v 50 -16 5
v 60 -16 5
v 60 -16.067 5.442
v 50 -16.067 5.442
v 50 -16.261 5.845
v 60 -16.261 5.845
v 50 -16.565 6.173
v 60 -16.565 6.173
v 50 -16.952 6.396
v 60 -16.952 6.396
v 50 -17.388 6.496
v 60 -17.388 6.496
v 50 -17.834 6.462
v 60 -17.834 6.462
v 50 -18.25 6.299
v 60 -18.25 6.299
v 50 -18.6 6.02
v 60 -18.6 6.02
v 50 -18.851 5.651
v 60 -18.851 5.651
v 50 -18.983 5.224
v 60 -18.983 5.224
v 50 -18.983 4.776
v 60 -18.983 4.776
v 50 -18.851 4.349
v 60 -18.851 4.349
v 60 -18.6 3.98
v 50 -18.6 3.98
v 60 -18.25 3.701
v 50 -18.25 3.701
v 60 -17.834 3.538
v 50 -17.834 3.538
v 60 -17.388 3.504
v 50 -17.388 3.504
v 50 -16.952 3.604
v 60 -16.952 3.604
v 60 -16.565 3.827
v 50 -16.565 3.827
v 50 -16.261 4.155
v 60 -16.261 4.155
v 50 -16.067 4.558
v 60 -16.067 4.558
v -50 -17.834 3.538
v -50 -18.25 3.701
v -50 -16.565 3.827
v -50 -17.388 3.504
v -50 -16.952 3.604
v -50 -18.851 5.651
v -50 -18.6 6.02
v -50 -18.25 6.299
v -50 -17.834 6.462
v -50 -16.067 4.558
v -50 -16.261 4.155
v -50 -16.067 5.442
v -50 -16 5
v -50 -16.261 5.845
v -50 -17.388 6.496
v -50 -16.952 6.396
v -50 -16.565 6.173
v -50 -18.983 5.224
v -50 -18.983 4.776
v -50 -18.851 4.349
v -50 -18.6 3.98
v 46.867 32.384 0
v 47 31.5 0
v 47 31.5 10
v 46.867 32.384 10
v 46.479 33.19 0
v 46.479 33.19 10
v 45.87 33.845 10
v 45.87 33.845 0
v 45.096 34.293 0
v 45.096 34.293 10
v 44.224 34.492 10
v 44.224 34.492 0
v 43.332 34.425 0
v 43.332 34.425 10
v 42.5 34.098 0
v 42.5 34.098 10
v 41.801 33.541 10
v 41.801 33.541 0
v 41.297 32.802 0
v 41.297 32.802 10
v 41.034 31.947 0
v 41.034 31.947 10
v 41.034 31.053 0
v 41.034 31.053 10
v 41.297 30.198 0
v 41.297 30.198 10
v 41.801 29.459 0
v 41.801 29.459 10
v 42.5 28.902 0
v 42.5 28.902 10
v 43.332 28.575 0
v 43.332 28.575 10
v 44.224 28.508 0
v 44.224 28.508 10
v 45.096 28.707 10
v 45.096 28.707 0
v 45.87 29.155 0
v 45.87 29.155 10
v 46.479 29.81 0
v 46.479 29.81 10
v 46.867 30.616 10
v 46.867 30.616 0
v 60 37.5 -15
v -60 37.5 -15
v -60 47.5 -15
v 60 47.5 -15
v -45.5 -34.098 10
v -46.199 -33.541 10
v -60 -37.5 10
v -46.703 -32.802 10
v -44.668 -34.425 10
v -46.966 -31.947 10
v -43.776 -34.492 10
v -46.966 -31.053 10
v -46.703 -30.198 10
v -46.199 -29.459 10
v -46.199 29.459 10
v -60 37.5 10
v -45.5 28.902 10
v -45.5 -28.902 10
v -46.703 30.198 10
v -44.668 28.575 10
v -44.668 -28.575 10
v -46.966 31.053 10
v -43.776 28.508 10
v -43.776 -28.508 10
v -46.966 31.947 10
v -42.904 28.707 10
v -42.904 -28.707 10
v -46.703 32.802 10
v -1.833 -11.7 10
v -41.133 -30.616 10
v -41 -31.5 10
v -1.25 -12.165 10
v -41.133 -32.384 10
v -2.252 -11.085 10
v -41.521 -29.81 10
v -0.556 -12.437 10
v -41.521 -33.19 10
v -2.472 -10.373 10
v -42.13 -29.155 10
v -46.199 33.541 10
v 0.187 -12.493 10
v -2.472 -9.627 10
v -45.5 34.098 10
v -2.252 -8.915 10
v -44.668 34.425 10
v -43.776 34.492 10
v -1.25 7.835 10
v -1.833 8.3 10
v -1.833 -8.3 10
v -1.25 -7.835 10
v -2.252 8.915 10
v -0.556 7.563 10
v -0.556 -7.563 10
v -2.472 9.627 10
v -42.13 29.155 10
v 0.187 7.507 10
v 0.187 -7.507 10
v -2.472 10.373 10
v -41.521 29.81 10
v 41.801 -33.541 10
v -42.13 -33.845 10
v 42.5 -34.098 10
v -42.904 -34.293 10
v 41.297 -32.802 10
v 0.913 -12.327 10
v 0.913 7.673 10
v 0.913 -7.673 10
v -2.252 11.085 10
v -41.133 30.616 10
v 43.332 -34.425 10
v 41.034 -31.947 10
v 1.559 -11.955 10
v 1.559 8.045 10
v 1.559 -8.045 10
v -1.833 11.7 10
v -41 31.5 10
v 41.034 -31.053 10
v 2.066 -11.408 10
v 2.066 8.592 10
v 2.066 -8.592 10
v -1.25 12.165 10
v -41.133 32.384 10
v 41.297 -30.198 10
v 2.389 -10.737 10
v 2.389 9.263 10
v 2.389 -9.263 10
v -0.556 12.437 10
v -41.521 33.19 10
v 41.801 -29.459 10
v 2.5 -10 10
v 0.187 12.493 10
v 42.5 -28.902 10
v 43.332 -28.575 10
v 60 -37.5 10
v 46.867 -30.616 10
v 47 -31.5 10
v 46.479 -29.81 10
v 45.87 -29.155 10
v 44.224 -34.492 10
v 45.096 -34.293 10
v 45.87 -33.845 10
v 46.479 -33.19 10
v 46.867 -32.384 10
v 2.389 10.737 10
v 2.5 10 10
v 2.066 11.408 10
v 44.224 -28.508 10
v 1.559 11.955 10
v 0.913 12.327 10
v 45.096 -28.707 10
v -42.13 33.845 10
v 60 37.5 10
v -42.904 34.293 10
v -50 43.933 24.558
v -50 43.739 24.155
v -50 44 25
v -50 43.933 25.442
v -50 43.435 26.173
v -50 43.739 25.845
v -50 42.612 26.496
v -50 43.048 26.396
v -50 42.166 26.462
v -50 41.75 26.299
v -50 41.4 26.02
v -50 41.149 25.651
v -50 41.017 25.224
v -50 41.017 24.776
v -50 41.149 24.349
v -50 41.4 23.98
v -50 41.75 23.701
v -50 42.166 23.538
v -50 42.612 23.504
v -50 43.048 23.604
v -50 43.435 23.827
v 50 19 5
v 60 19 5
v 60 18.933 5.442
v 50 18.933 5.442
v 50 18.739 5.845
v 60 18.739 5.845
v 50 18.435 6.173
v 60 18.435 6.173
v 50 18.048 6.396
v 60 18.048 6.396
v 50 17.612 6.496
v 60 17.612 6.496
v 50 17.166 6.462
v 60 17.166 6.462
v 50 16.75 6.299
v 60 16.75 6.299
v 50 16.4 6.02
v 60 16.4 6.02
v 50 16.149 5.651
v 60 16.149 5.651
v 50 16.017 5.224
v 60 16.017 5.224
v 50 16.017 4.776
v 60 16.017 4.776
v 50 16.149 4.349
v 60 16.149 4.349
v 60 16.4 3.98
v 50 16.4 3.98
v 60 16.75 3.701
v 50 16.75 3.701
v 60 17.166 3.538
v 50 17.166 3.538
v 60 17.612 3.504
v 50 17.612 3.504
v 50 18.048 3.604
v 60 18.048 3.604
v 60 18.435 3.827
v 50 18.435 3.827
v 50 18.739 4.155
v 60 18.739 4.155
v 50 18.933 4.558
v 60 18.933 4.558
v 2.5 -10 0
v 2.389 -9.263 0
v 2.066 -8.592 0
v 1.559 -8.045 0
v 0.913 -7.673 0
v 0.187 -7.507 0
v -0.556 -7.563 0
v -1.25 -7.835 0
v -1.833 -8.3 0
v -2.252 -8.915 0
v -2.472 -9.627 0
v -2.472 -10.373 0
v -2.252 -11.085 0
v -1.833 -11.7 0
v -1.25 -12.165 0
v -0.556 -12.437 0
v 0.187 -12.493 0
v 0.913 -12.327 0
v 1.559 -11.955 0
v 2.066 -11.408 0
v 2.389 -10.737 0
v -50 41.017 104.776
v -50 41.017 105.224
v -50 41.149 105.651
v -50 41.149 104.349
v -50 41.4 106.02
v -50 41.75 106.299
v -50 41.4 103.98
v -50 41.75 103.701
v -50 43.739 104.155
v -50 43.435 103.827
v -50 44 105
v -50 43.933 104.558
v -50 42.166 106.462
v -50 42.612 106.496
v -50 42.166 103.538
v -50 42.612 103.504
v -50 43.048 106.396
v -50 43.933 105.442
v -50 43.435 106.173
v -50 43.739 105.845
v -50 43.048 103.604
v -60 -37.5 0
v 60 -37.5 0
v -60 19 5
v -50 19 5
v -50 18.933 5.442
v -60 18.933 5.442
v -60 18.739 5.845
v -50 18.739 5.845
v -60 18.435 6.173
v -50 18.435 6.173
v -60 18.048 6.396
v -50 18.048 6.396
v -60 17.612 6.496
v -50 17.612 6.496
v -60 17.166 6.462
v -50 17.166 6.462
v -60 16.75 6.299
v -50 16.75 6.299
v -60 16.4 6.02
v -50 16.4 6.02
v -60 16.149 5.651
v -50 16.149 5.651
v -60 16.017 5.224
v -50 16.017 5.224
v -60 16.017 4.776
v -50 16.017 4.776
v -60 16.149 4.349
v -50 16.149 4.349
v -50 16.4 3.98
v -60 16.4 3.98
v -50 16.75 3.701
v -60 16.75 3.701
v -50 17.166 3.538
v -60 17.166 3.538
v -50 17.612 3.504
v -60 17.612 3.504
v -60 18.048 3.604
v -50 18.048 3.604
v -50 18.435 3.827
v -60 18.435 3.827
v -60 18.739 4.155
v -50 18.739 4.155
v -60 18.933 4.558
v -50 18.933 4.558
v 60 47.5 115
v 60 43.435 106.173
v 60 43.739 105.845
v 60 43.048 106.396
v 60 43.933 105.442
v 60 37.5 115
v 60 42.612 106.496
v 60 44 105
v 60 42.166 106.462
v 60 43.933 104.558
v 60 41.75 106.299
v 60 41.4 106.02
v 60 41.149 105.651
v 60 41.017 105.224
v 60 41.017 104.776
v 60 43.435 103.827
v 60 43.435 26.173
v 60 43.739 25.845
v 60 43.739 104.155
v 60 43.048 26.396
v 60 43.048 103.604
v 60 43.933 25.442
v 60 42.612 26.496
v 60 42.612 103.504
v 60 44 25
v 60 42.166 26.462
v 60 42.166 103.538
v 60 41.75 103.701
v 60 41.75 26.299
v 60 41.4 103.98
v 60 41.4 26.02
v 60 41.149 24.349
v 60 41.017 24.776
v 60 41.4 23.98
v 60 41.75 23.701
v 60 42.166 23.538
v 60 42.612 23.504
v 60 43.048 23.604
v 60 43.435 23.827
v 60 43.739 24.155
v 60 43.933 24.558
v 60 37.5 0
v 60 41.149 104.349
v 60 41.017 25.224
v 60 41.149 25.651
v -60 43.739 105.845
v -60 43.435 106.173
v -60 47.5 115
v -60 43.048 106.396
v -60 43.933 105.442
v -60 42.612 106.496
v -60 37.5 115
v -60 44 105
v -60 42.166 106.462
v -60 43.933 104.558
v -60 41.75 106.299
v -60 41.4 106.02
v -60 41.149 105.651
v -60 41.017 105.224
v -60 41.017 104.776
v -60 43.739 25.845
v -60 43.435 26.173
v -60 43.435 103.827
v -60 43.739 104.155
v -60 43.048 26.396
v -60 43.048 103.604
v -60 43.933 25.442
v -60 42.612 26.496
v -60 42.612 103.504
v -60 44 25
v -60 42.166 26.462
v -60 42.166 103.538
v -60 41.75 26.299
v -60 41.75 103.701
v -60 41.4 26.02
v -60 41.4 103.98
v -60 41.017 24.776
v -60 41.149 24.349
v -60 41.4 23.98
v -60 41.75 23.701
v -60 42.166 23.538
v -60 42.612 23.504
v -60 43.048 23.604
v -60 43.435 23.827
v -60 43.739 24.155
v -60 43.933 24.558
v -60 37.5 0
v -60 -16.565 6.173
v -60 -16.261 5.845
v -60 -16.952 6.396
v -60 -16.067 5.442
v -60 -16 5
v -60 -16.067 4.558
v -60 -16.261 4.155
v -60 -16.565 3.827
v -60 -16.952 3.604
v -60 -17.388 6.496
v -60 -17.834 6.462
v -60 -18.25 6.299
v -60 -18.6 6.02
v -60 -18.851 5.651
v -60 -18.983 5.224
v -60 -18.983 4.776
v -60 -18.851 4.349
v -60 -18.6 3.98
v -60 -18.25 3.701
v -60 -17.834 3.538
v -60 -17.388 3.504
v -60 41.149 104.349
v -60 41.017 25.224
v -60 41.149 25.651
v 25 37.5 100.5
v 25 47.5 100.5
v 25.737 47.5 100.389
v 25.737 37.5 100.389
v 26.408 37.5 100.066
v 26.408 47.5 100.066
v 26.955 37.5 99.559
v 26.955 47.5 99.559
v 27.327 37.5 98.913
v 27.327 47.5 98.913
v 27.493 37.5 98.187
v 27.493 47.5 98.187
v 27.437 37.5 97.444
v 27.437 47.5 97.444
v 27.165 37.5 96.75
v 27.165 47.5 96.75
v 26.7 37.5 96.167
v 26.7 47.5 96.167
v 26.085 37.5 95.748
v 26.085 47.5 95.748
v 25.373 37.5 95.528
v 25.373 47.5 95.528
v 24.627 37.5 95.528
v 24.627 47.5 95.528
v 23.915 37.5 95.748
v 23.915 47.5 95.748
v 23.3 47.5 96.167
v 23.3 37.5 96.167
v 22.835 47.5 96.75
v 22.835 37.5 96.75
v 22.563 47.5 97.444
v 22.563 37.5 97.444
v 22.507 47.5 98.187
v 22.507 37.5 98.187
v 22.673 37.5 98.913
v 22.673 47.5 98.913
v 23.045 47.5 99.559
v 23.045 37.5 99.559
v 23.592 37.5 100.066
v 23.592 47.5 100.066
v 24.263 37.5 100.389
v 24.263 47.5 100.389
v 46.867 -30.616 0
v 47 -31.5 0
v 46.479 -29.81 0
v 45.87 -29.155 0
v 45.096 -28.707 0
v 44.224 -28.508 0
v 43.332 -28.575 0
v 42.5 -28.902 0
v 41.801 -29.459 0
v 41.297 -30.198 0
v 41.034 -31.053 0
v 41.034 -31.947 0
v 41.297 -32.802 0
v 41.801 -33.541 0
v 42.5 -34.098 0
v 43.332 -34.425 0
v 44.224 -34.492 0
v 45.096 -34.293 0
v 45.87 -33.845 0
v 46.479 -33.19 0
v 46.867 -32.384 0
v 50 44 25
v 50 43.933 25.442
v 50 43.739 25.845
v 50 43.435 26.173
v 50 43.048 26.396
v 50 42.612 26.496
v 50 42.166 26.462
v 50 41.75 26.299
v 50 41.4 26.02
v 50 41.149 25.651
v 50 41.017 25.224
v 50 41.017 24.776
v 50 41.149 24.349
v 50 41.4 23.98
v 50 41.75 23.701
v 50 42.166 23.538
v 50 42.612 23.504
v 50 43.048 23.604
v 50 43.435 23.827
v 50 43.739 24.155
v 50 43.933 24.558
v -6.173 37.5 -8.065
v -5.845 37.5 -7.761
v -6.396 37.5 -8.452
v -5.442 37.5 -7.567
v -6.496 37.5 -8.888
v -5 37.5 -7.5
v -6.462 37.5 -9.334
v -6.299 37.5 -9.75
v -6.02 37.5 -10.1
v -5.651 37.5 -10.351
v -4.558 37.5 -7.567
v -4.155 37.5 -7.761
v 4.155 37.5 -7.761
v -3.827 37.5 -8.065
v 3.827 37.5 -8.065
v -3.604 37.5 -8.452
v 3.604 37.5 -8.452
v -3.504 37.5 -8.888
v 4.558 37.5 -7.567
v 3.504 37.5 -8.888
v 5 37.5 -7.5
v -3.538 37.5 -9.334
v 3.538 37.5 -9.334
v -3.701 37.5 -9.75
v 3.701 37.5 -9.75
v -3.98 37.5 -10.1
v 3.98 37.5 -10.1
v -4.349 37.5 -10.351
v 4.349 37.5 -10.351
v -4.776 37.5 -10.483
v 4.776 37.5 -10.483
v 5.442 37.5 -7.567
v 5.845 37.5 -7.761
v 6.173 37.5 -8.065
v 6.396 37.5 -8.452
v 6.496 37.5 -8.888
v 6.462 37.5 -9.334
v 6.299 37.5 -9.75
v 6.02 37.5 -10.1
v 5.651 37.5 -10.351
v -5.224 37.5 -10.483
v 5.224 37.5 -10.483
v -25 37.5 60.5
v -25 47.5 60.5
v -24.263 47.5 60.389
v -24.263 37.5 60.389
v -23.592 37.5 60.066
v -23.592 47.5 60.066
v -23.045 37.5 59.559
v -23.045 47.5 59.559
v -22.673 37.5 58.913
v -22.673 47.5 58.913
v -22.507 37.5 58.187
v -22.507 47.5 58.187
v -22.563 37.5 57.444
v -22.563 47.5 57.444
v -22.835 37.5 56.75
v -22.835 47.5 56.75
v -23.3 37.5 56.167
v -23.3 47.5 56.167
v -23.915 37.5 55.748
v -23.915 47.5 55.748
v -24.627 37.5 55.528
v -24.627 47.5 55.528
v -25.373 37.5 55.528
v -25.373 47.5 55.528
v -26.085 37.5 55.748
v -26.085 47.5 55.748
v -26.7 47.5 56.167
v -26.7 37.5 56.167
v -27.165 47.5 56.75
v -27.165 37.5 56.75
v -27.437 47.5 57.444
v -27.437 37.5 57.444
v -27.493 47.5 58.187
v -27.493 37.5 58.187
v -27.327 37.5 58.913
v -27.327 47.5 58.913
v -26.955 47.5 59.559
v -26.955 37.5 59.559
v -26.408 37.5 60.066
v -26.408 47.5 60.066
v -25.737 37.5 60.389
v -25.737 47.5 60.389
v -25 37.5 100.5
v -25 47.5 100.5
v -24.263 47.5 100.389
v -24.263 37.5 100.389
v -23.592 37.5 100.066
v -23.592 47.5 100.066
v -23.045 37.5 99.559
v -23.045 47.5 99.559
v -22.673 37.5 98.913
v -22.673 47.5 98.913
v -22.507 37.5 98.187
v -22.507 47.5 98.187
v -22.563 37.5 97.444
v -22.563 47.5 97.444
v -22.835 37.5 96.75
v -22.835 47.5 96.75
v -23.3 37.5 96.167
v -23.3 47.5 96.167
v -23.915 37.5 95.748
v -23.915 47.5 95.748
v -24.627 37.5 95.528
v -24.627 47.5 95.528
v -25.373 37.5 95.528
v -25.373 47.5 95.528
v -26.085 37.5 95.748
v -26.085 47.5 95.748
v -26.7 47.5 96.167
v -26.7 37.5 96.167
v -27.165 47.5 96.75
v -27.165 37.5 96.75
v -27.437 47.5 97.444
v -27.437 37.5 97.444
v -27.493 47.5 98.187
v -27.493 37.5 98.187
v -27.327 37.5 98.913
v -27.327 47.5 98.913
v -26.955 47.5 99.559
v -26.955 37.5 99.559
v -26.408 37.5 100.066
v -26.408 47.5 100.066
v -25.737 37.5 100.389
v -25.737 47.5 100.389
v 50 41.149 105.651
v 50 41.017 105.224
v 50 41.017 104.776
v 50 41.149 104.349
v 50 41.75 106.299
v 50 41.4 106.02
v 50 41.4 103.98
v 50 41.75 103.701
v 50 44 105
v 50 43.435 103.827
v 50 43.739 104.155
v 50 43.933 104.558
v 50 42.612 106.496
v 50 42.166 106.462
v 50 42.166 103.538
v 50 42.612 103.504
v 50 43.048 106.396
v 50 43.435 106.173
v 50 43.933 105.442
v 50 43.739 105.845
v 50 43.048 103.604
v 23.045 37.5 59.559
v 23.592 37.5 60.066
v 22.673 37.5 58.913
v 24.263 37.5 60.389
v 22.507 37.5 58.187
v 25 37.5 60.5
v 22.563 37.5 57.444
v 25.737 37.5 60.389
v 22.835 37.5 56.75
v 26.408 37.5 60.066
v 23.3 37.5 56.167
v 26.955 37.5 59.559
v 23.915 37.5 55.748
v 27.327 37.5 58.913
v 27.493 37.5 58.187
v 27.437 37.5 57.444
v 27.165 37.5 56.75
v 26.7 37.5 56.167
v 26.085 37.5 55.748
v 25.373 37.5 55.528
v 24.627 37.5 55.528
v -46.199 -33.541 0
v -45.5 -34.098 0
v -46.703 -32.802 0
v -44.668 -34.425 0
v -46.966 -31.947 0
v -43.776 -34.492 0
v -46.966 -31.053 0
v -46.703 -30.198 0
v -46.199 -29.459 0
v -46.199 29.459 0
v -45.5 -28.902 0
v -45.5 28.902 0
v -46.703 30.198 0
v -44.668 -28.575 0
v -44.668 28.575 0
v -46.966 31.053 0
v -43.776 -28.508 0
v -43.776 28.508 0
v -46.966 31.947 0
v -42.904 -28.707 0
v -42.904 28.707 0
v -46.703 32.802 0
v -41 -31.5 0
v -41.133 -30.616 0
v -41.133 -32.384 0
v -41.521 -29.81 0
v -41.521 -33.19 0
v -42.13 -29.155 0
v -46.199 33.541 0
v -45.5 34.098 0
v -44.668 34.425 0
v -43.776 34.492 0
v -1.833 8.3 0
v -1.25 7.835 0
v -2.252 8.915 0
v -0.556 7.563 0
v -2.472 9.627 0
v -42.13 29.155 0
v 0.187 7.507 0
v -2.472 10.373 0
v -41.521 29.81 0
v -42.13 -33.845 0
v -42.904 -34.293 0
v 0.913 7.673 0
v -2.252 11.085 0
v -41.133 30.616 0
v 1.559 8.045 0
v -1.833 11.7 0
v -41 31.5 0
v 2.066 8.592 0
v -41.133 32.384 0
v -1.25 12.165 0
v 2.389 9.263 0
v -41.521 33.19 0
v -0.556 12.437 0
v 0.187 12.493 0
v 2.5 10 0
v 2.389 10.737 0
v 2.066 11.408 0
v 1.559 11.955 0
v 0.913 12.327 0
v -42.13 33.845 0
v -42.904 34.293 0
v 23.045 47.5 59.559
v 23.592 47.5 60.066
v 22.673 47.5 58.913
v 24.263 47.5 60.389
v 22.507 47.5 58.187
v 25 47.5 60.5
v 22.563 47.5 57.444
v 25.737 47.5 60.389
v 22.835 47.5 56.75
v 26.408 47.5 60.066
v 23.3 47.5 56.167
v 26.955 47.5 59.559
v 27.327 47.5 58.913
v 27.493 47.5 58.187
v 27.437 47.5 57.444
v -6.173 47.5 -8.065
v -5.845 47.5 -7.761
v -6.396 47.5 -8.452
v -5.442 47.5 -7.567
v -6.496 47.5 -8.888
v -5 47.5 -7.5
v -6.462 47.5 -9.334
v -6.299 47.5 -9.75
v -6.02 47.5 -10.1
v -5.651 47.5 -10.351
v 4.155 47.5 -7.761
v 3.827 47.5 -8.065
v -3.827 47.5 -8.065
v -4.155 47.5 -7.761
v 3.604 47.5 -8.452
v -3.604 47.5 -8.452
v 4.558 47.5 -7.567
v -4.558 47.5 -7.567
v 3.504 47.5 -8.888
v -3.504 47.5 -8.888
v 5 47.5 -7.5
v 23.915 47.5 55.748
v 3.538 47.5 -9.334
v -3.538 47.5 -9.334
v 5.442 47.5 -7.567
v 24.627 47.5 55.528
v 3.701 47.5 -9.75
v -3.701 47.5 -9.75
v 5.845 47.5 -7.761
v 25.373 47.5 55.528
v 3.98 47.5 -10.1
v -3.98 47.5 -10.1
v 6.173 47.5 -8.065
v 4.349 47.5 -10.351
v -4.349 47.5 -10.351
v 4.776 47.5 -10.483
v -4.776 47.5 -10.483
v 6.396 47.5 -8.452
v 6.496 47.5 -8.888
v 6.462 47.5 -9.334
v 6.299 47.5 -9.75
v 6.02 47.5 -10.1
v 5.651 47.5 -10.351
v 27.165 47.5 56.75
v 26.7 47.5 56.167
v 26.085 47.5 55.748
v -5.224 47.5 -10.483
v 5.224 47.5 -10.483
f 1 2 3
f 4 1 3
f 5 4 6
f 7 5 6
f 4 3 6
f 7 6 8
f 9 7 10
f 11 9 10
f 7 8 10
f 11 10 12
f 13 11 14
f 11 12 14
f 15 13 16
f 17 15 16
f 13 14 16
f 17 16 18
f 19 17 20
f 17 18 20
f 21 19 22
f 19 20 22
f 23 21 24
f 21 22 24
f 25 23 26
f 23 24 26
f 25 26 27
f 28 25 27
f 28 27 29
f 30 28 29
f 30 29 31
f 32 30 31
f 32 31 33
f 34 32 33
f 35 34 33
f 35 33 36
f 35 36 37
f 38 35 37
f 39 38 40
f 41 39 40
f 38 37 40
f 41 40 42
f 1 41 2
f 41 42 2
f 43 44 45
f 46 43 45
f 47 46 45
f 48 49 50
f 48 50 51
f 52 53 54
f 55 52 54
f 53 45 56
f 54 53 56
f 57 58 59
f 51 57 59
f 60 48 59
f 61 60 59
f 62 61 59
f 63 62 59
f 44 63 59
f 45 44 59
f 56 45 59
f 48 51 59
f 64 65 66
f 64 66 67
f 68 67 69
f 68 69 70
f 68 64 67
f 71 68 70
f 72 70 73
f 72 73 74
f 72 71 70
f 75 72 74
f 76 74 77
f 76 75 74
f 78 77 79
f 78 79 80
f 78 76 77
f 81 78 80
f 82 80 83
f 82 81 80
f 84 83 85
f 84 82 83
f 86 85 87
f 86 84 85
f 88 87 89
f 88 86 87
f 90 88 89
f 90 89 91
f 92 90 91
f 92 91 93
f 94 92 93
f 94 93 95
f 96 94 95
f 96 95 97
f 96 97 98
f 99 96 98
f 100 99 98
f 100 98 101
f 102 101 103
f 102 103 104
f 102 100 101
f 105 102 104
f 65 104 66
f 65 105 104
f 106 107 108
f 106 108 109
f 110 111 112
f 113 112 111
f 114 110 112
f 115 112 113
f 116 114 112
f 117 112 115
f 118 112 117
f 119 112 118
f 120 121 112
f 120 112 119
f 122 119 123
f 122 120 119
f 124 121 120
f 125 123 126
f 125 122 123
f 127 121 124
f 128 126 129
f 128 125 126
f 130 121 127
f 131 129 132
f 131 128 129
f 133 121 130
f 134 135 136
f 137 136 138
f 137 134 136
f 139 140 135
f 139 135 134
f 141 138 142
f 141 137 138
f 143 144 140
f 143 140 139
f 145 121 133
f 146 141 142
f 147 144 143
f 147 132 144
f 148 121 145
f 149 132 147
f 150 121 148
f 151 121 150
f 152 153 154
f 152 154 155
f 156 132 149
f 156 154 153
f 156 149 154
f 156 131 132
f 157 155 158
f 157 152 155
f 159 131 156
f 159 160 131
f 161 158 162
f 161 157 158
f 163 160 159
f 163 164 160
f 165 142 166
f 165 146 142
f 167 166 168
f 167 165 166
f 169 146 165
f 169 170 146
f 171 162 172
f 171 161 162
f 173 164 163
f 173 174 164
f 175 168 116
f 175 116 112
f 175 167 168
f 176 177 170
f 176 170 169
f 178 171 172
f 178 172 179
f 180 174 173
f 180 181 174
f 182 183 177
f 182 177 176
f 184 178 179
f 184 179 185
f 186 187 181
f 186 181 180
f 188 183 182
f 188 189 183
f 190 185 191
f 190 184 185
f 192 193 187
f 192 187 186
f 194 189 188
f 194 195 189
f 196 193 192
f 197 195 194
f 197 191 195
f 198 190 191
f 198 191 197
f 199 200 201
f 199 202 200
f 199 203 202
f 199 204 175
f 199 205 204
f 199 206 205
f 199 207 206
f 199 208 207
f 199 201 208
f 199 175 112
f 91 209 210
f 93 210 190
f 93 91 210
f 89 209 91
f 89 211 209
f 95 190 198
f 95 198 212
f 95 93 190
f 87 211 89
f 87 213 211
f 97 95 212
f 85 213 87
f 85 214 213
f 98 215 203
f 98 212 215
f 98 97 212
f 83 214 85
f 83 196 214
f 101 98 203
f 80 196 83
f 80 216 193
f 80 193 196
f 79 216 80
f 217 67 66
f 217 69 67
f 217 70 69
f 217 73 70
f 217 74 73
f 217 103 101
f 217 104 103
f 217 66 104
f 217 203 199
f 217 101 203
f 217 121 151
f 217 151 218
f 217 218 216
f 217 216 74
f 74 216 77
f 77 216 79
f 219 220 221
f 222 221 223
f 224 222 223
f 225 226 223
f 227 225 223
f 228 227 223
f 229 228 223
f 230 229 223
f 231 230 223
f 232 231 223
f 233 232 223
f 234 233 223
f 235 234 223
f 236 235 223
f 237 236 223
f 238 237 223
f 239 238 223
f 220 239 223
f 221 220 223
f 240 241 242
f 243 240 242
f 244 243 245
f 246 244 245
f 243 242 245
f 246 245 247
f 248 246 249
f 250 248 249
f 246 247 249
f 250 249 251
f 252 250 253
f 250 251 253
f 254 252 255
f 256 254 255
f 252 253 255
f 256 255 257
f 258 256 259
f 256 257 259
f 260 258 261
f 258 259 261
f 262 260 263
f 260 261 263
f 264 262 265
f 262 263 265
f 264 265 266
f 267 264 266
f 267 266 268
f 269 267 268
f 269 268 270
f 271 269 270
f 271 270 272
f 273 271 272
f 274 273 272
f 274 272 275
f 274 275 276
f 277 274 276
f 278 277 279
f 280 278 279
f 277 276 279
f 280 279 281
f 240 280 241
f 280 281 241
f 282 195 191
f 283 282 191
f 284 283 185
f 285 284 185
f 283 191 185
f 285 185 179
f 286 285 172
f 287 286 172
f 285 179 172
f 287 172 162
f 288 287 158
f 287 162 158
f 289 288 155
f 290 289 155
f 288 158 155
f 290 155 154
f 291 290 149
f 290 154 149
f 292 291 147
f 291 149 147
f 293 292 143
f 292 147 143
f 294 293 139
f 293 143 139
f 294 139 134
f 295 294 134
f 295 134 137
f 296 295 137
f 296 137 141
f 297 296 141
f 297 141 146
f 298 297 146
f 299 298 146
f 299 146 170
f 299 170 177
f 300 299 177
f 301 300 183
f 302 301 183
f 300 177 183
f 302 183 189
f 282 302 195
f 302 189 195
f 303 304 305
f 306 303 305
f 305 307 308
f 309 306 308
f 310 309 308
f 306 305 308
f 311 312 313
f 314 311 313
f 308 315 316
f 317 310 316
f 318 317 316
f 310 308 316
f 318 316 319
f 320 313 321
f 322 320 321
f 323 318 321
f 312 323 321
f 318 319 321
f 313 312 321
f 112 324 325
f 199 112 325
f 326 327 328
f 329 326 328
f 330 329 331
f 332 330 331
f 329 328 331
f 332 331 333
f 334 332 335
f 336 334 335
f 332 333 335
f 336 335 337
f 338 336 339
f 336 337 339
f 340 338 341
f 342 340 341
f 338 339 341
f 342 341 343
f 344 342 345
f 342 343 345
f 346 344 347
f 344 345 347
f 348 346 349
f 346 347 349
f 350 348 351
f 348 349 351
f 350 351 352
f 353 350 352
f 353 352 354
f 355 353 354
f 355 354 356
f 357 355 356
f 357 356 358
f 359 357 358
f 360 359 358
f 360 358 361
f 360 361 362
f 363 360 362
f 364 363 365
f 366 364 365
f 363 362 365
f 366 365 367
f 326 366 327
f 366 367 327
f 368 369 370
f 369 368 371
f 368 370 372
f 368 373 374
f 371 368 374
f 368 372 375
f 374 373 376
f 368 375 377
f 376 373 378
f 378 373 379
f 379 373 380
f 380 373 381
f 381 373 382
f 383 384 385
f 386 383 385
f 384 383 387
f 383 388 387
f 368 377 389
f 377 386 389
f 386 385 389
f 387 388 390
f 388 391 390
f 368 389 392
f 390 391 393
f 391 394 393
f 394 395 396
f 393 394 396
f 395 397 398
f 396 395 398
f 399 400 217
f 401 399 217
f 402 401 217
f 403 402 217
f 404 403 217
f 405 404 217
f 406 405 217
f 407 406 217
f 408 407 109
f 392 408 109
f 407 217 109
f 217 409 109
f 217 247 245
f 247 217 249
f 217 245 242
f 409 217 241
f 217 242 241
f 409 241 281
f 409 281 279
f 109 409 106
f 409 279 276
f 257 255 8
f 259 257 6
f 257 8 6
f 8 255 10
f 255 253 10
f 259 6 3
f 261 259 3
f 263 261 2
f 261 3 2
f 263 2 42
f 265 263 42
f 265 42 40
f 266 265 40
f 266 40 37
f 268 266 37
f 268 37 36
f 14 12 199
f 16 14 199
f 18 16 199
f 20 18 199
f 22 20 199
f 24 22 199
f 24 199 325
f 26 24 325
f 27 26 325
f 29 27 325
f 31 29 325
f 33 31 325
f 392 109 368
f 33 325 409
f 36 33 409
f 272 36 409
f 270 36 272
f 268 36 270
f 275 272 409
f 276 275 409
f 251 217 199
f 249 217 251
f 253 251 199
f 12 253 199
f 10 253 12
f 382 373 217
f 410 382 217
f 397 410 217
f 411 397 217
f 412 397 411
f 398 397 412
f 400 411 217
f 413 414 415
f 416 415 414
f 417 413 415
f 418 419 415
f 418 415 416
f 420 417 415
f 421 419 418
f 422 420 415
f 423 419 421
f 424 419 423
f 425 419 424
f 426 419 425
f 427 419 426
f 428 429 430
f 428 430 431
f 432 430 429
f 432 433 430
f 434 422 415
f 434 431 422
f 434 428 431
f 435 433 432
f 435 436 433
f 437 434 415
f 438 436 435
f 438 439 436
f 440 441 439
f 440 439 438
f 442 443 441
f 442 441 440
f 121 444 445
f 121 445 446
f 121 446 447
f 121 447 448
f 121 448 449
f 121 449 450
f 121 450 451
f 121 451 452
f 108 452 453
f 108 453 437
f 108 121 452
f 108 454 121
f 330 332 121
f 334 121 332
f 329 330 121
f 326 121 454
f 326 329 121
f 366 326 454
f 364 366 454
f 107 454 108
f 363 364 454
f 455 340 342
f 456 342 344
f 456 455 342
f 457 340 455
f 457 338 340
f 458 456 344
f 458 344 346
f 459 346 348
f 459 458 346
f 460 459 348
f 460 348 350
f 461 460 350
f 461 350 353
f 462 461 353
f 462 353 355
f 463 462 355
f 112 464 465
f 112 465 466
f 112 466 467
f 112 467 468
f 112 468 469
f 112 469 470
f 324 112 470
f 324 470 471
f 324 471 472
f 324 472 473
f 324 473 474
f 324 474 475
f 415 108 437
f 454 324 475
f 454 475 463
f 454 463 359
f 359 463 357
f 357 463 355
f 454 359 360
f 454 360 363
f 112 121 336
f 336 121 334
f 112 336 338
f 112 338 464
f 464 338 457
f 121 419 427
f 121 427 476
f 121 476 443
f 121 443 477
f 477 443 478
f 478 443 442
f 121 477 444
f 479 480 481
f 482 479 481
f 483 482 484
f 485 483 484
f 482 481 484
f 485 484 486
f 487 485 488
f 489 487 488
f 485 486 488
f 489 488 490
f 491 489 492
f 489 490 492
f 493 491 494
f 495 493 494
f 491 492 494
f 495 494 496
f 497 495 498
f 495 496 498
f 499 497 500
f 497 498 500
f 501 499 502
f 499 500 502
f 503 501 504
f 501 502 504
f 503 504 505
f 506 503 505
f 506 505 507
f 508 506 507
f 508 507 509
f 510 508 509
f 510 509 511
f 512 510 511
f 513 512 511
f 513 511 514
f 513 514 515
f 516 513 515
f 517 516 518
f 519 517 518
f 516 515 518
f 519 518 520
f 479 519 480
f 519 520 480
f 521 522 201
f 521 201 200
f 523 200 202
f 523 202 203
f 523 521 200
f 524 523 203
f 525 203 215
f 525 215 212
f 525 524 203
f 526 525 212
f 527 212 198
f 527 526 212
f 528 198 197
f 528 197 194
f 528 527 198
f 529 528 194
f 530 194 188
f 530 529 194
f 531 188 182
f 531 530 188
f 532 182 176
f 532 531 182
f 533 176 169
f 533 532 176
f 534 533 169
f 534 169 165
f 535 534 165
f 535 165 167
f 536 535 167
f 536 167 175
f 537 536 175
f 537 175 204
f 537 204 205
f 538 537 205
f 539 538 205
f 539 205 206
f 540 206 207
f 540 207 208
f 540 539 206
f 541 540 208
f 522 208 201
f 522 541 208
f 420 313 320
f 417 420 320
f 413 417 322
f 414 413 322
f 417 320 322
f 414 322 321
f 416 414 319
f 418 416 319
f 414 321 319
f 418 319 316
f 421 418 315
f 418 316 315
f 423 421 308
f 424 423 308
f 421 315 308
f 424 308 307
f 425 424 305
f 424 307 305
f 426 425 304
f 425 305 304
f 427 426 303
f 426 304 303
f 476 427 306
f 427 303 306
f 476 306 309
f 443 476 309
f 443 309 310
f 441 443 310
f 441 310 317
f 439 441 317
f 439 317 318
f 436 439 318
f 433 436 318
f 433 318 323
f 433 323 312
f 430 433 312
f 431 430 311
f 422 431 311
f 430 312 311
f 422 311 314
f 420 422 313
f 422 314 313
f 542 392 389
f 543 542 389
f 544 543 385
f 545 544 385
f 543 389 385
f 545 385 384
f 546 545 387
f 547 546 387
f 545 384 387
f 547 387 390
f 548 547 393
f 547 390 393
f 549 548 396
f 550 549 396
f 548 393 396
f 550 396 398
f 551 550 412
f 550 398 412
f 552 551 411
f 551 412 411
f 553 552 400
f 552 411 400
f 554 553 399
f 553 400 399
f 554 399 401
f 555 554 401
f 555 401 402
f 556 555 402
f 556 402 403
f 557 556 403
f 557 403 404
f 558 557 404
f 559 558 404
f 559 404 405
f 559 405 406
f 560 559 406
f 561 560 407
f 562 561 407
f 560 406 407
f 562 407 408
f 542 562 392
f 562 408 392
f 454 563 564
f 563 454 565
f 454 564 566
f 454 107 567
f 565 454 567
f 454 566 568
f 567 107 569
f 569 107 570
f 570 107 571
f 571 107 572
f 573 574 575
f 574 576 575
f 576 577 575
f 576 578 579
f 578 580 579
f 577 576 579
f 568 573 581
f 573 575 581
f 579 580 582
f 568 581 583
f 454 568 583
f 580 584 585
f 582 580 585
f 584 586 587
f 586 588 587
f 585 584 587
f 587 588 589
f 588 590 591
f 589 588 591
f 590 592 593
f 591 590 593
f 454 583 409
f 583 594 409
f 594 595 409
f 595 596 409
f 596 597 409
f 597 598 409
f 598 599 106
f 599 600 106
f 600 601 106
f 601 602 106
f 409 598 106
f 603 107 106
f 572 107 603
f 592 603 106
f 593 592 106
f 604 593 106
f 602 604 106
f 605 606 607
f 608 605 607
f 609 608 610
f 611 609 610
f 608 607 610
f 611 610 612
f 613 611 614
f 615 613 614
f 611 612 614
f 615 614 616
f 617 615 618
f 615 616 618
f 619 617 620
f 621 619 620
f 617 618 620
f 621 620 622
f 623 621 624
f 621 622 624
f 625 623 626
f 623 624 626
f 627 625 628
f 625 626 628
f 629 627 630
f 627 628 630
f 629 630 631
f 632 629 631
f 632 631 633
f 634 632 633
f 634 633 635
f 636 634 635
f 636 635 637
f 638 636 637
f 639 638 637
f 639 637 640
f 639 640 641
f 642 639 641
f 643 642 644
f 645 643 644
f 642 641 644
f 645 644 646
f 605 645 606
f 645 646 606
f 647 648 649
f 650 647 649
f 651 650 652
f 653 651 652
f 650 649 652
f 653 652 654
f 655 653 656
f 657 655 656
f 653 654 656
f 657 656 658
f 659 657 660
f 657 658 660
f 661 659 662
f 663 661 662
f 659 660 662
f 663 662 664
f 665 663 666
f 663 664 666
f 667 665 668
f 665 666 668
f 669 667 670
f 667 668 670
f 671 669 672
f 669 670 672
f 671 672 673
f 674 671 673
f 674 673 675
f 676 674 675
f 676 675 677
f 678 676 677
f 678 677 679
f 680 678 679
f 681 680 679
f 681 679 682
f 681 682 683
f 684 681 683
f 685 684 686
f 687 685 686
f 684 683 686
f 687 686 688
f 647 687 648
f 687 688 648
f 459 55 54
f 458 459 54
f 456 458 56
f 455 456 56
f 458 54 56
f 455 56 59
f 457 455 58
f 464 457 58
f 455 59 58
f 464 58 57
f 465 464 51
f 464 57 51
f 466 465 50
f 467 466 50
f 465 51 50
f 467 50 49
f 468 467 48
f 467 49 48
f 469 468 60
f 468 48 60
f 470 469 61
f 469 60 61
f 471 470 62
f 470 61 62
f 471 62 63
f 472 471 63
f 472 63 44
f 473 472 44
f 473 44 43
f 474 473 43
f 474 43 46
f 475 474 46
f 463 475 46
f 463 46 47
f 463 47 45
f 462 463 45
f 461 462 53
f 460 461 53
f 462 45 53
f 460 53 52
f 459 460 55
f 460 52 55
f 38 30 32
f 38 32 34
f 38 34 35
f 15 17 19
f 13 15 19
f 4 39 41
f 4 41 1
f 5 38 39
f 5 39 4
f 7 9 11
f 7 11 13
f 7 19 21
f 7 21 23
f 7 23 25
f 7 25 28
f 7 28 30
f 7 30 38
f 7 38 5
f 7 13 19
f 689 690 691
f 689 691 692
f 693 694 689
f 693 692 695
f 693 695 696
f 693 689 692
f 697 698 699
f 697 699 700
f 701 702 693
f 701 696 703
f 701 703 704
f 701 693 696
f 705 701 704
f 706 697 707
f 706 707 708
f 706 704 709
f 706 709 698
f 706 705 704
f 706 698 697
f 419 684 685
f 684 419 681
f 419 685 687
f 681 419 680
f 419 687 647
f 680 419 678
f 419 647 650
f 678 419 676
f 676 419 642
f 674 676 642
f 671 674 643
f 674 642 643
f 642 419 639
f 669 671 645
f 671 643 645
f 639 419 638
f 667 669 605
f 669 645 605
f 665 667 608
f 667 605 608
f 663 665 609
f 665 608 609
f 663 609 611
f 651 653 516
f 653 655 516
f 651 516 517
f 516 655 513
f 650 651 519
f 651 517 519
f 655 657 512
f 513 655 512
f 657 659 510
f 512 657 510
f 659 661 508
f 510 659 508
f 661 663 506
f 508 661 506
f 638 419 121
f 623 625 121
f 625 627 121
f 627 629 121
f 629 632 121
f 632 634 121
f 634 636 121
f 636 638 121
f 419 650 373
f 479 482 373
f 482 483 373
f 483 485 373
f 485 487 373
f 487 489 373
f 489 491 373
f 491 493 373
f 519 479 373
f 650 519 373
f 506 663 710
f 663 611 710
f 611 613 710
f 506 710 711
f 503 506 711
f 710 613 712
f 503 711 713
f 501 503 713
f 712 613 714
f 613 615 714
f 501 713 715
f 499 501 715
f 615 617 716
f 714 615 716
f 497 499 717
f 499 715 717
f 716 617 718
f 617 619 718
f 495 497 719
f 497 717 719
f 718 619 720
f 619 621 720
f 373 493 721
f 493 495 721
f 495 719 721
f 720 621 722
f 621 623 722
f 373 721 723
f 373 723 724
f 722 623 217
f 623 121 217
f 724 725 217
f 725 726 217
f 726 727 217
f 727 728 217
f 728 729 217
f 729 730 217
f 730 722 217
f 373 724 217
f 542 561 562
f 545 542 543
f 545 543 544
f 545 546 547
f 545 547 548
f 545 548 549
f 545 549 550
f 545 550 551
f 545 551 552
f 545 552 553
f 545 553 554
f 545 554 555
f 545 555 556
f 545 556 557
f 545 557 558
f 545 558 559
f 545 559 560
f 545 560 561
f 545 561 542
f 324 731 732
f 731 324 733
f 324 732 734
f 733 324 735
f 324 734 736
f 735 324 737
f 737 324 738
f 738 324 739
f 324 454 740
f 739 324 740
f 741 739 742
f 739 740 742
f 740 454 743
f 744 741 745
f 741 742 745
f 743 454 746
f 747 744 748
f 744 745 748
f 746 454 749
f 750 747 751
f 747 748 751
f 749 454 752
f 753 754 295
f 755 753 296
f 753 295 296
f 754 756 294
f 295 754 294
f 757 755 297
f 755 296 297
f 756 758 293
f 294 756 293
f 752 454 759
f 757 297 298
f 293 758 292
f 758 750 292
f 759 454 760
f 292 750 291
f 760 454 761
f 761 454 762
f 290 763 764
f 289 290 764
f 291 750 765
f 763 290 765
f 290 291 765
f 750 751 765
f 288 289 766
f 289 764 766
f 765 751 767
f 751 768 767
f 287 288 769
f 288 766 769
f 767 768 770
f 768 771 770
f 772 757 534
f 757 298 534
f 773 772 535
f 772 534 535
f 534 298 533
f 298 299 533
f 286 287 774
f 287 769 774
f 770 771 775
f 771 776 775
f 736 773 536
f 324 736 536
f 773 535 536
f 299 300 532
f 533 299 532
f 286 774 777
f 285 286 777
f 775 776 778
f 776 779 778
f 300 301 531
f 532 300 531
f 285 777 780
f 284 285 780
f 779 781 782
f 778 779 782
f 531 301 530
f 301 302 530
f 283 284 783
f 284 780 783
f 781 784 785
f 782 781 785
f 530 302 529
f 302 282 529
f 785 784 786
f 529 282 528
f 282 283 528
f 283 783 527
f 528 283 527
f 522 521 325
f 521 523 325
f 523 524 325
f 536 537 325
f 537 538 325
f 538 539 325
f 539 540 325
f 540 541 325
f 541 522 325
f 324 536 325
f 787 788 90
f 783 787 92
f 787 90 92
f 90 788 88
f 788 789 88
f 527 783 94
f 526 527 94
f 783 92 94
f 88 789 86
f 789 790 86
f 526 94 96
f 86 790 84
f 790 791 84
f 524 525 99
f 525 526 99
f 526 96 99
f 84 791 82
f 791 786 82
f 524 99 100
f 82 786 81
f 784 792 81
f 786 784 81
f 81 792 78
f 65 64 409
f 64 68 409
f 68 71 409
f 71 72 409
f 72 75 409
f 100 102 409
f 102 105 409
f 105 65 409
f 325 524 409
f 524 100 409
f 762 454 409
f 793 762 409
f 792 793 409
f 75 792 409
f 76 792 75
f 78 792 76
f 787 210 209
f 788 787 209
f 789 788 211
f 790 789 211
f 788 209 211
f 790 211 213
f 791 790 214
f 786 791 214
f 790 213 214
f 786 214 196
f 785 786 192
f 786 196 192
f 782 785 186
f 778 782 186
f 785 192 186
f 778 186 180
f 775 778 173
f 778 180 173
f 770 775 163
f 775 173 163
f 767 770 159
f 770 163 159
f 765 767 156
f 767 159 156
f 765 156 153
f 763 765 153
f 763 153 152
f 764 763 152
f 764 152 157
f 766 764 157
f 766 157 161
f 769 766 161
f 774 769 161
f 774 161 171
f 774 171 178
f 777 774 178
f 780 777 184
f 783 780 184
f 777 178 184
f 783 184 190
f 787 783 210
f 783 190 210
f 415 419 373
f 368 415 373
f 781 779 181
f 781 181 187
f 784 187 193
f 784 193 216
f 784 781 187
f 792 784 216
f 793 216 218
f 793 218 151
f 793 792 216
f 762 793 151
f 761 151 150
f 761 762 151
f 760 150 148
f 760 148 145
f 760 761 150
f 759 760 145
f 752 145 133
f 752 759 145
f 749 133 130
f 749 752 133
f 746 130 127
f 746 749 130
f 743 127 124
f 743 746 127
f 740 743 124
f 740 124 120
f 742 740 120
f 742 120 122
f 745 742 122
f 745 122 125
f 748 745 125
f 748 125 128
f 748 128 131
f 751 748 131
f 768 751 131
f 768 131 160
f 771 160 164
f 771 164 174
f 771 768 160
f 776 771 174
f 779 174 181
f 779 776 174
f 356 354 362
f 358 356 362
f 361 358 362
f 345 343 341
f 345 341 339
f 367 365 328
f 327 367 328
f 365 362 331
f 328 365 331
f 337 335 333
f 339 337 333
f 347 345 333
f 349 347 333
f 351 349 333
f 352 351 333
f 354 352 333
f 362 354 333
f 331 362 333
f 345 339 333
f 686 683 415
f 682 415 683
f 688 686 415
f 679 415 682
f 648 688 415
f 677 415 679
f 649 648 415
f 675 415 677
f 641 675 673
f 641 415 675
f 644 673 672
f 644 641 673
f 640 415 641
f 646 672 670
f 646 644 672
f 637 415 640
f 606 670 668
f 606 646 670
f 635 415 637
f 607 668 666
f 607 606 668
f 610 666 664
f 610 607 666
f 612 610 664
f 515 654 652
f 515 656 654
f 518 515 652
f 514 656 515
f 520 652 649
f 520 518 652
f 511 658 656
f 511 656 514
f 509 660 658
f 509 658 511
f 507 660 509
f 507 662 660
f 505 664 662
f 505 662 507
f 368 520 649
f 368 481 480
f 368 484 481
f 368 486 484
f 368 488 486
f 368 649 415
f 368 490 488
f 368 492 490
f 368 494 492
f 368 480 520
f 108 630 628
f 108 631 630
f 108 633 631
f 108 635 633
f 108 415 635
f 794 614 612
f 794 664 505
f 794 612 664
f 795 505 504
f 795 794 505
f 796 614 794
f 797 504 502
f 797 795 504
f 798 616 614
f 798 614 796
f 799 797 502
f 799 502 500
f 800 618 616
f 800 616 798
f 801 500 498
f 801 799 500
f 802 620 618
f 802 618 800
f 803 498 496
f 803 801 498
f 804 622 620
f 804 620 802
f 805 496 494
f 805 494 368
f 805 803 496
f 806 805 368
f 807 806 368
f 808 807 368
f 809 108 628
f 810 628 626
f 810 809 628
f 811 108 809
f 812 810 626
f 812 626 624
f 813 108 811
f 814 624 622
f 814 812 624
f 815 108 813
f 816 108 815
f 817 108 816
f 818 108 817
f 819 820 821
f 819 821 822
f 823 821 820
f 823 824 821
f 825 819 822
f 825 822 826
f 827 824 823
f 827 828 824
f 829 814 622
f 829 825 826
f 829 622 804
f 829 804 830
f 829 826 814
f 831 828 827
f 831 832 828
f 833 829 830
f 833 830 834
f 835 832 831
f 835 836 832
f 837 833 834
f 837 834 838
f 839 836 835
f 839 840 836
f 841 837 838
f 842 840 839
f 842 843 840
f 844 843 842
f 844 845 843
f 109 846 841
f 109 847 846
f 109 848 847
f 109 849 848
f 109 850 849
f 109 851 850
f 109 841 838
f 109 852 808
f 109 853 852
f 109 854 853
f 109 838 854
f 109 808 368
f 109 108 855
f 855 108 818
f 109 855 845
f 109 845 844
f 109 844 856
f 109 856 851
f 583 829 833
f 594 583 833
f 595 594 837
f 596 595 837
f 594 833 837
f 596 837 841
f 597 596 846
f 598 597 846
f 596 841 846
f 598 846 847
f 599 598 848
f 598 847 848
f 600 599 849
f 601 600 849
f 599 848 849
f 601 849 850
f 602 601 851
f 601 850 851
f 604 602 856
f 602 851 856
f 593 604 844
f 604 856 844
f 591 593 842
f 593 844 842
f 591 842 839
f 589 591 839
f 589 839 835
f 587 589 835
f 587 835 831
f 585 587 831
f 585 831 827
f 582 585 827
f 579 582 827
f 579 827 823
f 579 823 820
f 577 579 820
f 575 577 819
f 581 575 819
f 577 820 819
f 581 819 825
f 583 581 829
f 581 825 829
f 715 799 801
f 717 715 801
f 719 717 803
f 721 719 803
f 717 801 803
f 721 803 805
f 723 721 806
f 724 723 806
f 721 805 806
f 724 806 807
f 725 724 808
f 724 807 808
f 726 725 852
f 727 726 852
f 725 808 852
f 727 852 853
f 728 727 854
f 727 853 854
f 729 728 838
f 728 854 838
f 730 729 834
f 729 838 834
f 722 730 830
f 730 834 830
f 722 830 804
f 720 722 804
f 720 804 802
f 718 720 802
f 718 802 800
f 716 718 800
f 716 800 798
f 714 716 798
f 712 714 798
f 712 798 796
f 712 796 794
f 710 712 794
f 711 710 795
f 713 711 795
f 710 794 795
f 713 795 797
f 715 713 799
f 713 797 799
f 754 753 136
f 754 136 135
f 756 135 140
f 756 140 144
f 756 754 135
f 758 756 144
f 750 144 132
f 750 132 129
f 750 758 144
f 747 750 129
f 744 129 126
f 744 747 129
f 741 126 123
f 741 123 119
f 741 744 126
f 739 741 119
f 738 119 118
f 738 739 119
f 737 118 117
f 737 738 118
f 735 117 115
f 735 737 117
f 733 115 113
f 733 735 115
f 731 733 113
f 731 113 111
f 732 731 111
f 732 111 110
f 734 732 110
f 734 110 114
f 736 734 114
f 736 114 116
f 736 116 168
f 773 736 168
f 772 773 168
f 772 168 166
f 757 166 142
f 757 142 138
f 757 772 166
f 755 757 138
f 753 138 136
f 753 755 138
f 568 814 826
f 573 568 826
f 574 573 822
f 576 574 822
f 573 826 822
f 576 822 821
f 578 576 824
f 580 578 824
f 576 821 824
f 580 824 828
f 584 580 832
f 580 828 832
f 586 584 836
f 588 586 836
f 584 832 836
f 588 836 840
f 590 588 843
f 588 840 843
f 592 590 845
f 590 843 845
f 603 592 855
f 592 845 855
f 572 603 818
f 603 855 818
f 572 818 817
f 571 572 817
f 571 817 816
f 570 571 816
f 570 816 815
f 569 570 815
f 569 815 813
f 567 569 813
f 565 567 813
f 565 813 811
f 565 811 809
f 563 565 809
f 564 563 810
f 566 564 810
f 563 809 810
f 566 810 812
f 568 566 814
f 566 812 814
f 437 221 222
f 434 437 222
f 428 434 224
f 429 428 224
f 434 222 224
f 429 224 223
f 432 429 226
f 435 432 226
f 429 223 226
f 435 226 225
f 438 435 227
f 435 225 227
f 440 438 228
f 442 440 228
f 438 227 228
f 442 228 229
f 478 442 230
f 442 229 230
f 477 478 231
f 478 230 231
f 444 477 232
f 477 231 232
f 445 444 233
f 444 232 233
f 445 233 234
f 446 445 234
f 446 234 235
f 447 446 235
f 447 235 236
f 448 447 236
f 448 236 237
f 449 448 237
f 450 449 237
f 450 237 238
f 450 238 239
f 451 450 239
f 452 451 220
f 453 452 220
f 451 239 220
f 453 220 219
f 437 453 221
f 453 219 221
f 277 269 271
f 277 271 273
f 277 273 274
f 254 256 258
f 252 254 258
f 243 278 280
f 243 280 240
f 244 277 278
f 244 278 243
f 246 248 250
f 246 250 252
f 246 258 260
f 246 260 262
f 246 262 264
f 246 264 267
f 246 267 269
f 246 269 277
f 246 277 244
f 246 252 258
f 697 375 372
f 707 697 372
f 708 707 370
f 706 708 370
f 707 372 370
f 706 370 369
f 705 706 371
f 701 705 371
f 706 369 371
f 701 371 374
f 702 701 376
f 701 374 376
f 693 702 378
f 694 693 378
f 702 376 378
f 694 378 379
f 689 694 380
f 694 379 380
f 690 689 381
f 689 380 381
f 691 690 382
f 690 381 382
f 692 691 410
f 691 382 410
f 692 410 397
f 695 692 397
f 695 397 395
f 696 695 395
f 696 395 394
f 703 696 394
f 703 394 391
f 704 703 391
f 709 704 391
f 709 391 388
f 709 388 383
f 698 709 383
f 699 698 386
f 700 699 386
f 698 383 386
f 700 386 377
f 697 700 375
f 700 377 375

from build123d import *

# Parameters (mm, degrees)
SKETCH1_W           = 120
SKETCH1_H           = 75
SKETCH1_R           = 3
BOSS_EXTRUDE1_DEPTH = 10
SKETCH2_R           = 2.5
CUT_EXTRUDE1_DEPTH  = 10
SKETCH3_R           = 1.5
CUT_EXTRUDE2_DEPTH  = 10
LPATTERN1_COUNT     = 2
LPATTERN1_PITCH     = 110
SKETCH4_W           = 120
SKETCH4_H           = 130
BOSS_EXTRUDE2_DEPTH = 10
SKETCH5_R           = 1.5
CUT_EXTRUDE3_DEPTH  = 10
LPATTERN2_COUNT     = 2
LPATTERN2_PITCH     = 110
SKETCH6_R           = 2.5
CUT_EXTRUDE4_DEPTH  = 10
SKETCH7_R           = 1.5
CUT_EXTRUDE5_DEPTH  = 10


with BuildPart() as part:
    # Sketch1 → Boss-Extrude1 (new body)
    with BuildSketch(Plane.XY):
        Rectangle(SKETCH1_W, SKETCH1_H)
        with Locations((-44, 31.5)):
            Circle(SKETCH1_R, mode=Mode.SUBTRACT)
        with Locations((44, 31.5)):
            Circle(SKETCH1_R, mode=Mode.SUBTRACT)
        with Locations((-44, -31.5)):
            Circle(SKETCH1_R, mode=Mode.SUBTRACT)
        with Locations((44, -31.5)):
            Circle(SKETCH1_R, mode=Mode.SUBTRACT)
    extrude(amount=BOSS_EXTRUDE1_DEPTH)

    # Sketch2 → Cut-Extrude1 (cut)
    with BuildSketch(Plane.XY.offset(10)):
        with Locations((0, 10)):
            Circle(SKETCH2_R)
        with Locations((0, -10)):
            Circle(SKETCH2_R)
    extrude(amount=-CUT_EXTRUDE1_DEPTH, mode=Mode.SUBTRACT)

    # Sketch3 → Cut-Extrude2 (cut)
    with BuildSketch(Plane(origin=(60, 0, 0), x_dir=(0, 0, -1), z_dir=(1, 0, 0))):
        with Locations(Location((-5, 17.5, 0), (0, 0, 90))):
            Circle(SKETCH3_R)
        with Locations(Location((-5, -17.5, 0), (0, 0, 90))):
            Circle(SKETCH3_R)
    cut_extrude2 = extrude(amount=-CUT_EXTRUDE2_DEPTH, mode=Mode.SUBTRACT)

    # LPattern1: Cut-Extrude2 ×2
    with Locations(*[(-i * LPATTERN1_PITCH, 0, 0) for i in range(1, LPATTERN1_COUNT)]):
        add(cut_extrude2, mode=Mode.SUBTRACT)

    # Sketch4 → Boss-Extrude2 (add)
    with BuildSketch(Plane(origin=(0, 37.5, 0), x_dir=(1, 0, 0), z_dir=(0, 1, 0))):
        with Locations((0, -50)):
            Rectangle(SKETCH4_W, SKETCH4_H)
    extrude(amount=BOSS_EXTRUDE2_DEPTH)

    # Sketch5 → Cut-Extrude3 (cut)
    with BuildSketch(Plane(origin=(60, 0, 0), x_dir=(0, 0, -1), z_dir=(1, 0, 0))):
        with Locations(Location((-105, 42.5, 0), (0, 0, 90))):
            Circle(SKETCH5_R)
        with Locations(Location((-25, 42.5, 0), (0, 0, 90))):
            Circle(SKETCH5_R)
    cut_extrude3 = extrude(amount=-CUT_EXTRUDE3_DEPTH, mode=Mode.SUBTRACT)

    # LPattern2: Cut-Extrude3 ×2
    with Locations(*[(-i * LPATTERN2_PITCH, 0, 0) for i in range(1, LPATTERN2_COUNT)]):
        add(cut_extrude3, mode=Mode.SUBTRACT)

    # Sketch6 → Cut-Extrude4 (cut)
    with BuildSketch(Plane(origin=(0, 47.5, 0), x_dir=(1, 0, 0), z_dir=(0, 1, 0))):
        with Locations(Location((-25, -98, 0), (0, 0, 270))):
            Circle(SKETCH6_R)
        with Locations(Location((25, -98, 0), (0, 0, 270))):
            Circle(SKETCH6_R)
        with Locations(Location((-25, -58, 0), (0, 0, 270))):
            Circle(SKETCH6_R)
        with Locations(Location((25, -58, 0), (0, 0, 270))):
            Circle(SKETCH6_R)
    extrude(amount=-CUT_EXTRUDE4_DEPTH, mode=Mode.SUBTRACT)

    # Sketch7 → Cut-Extrude5 (cut)
    with BuildSketch(Plane(origin=(0, 47.5, 0), x_dir=(1, 0, 0), z_dir=(0, 1, 0))):
        with Locations(Location((-5, 9, 0), (0, 0, 270))):
            Circle(SKETCH7_R)
        with Locations(Location((5, 9, 0), (0, 0, 270))):
            Circle(SKETCH7_R)
    extrude(amount=-CUT_EXTRUDE5_DEPTH, mode=Mode.SUBTRACT)


solid = part.part
